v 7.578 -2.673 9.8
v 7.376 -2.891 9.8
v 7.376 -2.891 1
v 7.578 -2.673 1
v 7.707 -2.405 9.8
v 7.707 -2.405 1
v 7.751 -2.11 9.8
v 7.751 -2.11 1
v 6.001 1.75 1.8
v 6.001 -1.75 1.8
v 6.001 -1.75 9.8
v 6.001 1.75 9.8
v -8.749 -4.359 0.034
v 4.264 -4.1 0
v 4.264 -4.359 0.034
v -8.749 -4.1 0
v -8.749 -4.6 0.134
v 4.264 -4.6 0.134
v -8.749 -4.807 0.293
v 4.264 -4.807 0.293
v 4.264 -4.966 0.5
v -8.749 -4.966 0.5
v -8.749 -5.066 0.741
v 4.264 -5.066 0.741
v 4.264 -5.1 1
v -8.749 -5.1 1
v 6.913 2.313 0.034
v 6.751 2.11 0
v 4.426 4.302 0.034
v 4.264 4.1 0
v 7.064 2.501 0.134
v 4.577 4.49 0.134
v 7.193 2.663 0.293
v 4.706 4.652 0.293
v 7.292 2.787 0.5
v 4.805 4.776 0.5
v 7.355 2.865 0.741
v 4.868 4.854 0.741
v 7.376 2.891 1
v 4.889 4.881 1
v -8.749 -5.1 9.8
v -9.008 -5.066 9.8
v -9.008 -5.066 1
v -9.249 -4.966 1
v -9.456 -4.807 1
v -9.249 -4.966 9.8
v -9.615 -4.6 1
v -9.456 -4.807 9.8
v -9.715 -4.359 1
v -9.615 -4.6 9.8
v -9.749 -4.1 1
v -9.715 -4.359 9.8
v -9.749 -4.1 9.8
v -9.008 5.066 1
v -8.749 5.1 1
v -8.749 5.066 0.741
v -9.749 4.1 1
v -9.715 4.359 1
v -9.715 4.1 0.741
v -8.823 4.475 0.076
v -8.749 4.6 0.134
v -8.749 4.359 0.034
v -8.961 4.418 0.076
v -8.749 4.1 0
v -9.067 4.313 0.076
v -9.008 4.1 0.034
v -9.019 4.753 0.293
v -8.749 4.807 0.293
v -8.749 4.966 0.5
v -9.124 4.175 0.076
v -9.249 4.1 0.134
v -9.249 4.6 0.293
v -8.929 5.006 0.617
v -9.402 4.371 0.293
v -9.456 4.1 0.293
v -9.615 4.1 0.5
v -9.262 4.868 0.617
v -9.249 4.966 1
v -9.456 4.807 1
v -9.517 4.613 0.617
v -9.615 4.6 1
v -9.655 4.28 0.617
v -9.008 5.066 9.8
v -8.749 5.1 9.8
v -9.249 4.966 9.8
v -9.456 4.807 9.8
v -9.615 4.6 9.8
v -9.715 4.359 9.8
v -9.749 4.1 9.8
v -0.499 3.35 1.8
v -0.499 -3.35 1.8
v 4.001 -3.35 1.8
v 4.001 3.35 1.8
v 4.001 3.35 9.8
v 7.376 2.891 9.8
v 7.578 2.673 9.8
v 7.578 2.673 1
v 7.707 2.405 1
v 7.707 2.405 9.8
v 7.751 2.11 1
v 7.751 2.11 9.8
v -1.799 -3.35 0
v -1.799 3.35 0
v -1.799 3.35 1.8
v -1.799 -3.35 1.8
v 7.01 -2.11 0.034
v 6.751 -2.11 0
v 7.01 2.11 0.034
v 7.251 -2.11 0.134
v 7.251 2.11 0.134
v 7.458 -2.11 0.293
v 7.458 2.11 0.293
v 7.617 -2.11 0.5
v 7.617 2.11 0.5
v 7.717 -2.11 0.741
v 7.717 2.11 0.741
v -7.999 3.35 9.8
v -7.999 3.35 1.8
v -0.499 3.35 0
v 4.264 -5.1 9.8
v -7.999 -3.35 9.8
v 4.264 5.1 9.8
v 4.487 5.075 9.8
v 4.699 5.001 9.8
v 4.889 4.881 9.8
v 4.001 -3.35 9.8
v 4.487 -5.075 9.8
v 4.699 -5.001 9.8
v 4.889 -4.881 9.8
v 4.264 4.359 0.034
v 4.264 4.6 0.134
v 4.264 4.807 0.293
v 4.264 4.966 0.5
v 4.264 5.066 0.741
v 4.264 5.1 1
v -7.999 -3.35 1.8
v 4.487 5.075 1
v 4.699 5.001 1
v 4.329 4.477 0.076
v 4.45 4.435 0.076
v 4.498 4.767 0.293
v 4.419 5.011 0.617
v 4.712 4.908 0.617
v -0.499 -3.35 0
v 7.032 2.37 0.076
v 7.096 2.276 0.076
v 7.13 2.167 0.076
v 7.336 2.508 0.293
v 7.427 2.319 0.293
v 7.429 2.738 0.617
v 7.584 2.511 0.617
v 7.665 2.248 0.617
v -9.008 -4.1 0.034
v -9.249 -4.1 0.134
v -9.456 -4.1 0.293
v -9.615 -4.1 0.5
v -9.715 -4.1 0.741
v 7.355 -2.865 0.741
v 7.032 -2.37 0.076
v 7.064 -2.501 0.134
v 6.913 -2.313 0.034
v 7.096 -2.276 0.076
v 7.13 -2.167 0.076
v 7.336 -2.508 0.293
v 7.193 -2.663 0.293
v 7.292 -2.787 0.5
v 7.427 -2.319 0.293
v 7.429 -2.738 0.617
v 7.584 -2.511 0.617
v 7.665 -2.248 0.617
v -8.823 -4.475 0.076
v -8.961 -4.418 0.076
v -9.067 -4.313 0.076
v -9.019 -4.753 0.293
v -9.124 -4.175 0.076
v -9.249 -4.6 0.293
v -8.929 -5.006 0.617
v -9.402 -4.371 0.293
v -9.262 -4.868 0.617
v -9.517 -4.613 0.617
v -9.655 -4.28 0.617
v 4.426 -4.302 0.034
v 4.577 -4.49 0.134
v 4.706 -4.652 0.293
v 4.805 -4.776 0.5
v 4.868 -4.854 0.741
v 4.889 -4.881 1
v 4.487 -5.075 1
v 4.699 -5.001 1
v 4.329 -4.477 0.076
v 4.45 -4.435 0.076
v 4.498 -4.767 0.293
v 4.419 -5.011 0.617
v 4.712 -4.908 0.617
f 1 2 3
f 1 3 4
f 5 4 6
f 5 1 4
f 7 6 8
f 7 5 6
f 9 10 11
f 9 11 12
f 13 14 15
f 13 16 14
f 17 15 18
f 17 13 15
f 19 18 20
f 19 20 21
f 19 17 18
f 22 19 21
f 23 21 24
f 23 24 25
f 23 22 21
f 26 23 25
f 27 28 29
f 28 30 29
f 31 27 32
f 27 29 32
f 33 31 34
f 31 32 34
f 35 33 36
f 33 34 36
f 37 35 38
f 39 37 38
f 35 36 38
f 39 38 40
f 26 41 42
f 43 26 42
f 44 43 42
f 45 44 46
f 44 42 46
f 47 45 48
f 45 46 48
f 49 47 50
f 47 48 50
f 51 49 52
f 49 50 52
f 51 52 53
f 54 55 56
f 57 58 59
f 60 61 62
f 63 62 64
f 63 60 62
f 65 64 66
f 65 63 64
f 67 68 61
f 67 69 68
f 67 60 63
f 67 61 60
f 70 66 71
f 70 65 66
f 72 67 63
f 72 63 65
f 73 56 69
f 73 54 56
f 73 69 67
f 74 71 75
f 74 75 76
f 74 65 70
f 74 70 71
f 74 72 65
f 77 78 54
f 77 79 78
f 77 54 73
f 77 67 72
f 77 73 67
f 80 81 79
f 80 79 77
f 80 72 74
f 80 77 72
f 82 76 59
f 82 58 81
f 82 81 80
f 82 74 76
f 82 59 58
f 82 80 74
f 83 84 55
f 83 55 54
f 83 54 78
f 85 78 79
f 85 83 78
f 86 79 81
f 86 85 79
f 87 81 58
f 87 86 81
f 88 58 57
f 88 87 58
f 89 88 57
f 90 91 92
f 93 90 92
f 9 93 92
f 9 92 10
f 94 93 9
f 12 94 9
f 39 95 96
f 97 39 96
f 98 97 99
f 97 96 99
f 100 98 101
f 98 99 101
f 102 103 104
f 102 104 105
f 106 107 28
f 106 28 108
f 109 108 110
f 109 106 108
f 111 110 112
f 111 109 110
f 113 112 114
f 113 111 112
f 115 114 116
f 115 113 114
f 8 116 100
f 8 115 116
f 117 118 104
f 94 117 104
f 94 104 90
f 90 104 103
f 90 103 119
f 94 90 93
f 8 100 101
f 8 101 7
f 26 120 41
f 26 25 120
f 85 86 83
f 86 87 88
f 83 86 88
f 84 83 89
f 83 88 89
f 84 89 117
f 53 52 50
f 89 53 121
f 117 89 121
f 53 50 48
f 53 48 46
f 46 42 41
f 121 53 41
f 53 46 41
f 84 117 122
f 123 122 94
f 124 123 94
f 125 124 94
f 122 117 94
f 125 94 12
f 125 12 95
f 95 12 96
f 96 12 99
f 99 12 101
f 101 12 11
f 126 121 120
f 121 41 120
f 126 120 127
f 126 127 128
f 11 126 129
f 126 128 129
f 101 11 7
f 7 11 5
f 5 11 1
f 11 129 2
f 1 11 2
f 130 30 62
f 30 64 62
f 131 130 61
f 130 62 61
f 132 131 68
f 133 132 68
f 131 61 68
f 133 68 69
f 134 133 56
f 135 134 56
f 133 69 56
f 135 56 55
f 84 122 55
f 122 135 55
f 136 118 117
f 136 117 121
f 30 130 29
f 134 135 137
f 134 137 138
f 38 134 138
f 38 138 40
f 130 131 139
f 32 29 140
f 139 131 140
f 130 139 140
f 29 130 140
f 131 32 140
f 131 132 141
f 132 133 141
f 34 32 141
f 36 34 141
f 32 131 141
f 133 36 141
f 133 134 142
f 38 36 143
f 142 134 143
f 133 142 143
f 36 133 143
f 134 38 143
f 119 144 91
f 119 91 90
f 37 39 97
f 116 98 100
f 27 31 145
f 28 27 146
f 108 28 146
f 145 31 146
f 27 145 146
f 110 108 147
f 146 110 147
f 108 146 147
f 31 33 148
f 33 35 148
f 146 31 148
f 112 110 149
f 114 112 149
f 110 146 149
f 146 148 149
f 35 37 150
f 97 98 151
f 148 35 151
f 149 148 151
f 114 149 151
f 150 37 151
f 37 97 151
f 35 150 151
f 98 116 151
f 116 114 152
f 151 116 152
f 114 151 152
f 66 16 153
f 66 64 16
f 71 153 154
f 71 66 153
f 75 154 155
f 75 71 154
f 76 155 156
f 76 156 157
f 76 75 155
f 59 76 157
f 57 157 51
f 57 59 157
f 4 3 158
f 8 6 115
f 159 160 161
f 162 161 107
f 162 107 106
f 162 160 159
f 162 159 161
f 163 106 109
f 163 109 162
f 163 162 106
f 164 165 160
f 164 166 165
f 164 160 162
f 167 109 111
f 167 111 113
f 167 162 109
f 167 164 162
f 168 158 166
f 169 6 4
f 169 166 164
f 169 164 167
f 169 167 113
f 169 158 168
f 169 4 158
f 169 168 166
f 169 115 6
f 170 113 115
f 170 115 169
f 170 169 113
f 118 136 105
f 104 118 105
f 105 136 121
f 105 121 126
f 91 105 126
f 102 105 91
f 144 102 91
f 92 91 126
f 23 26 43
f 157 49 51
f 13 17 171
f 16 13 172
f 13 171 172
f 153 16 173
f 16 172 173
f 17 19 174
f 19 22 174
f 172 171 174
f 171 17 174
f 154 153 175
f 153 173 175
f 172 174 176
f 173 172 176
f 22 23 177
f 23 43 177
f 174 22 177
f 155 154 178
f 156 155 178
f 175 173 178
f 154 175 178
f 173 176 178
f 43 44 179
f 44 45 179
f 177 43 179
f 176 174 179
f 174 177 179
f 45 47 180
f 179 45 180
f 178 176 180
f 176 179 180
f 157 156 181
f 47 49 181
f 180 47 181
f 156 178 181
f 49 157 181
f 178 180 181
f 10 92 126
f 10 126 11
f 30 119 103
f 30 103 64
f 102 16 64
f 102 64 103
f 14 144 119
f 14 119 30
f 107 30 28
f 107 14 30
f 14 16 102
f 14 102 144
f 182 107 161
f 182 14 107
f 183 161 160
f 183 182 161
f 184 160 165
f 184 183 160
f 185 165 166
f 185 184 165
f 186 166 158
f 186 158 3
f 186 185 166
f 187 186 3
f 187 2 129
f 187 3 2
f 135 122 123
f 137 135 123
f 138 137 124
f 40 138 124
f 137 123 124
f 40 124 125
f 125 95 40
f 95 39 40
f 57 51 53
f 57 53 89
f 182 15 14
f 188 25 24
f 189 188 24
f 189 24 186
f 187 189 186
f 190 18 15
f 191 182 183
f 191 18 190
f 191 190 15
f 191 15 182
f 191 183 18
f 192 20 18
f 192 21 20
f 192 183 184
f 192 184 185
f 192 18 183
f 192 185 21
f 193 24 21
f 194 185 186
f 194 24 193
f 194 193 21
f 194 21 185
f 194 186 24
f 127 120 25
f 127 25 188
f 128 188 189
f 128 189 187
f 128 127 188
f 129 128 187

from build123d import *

# Parameters (mm, degrees)
F0_W     = 6.2
F0_H     = 3.35
F1_DEPTH = 1.8
F2_DEPTH = 9.8
F3_R     = 1


with BuildPart() as f1:
    # F0 (on Top) → F1 (new body)
    with BuildSketch(Plane.XY):
        with Locations((-4.898699, 1.675)):
            Rectangle(F0_W, F0_H)
        Polygon((-0.498699, 3.35), (-0.498699, 0), (6.001301, 0), (6.001301, 1.75), (4.001301, 3.35), align=None)
    extrude(amount=F1_DEPTH)

    # F0 (on Top) → F2 (join)
    with BuildSketch(Plane.XY):
        Polygon((-9.748699, 0), (-7.998699, 0), (-7.998699, 3.35), (-1.798699, 3.35), (-0.498699, 3.35), (4.001301, 3.35), (6.001301, 1.75), (6.001301, 0), (7.751301, 0), (7.751301, 2.591093), (4.615168, 5.1), (-9.748699, 5.1), align=None)
    extrude(amount=F2_DEPTH)

    # F3
    f3_edges = [f1.edges().sort_by_distance(p)[0] for p in [
        (-9.748699, 5.1, 4.9),
        (4.615168, 5.1, 4.9),
        (7.751301, 2.591093, 4.9),
        (-2.566765, 5.1, 0),
        (6.183235, 3.845547, 0),
        (7.751301, 1.295547, 0),
        (-9.748699, 2.55, 0),
    ]]
    fillet(f3_edges, radius=F3_R)

    # F4: F1 across face


with BuildPart() as f1_1:
    add(f1.part)
    add(f1.part.mirror(Plane(origin=(5.186004, 0, 3.300707), x_dir=(1, 0, 0), z_dir=(0, -1, 0))))


solid = f1_1.part
